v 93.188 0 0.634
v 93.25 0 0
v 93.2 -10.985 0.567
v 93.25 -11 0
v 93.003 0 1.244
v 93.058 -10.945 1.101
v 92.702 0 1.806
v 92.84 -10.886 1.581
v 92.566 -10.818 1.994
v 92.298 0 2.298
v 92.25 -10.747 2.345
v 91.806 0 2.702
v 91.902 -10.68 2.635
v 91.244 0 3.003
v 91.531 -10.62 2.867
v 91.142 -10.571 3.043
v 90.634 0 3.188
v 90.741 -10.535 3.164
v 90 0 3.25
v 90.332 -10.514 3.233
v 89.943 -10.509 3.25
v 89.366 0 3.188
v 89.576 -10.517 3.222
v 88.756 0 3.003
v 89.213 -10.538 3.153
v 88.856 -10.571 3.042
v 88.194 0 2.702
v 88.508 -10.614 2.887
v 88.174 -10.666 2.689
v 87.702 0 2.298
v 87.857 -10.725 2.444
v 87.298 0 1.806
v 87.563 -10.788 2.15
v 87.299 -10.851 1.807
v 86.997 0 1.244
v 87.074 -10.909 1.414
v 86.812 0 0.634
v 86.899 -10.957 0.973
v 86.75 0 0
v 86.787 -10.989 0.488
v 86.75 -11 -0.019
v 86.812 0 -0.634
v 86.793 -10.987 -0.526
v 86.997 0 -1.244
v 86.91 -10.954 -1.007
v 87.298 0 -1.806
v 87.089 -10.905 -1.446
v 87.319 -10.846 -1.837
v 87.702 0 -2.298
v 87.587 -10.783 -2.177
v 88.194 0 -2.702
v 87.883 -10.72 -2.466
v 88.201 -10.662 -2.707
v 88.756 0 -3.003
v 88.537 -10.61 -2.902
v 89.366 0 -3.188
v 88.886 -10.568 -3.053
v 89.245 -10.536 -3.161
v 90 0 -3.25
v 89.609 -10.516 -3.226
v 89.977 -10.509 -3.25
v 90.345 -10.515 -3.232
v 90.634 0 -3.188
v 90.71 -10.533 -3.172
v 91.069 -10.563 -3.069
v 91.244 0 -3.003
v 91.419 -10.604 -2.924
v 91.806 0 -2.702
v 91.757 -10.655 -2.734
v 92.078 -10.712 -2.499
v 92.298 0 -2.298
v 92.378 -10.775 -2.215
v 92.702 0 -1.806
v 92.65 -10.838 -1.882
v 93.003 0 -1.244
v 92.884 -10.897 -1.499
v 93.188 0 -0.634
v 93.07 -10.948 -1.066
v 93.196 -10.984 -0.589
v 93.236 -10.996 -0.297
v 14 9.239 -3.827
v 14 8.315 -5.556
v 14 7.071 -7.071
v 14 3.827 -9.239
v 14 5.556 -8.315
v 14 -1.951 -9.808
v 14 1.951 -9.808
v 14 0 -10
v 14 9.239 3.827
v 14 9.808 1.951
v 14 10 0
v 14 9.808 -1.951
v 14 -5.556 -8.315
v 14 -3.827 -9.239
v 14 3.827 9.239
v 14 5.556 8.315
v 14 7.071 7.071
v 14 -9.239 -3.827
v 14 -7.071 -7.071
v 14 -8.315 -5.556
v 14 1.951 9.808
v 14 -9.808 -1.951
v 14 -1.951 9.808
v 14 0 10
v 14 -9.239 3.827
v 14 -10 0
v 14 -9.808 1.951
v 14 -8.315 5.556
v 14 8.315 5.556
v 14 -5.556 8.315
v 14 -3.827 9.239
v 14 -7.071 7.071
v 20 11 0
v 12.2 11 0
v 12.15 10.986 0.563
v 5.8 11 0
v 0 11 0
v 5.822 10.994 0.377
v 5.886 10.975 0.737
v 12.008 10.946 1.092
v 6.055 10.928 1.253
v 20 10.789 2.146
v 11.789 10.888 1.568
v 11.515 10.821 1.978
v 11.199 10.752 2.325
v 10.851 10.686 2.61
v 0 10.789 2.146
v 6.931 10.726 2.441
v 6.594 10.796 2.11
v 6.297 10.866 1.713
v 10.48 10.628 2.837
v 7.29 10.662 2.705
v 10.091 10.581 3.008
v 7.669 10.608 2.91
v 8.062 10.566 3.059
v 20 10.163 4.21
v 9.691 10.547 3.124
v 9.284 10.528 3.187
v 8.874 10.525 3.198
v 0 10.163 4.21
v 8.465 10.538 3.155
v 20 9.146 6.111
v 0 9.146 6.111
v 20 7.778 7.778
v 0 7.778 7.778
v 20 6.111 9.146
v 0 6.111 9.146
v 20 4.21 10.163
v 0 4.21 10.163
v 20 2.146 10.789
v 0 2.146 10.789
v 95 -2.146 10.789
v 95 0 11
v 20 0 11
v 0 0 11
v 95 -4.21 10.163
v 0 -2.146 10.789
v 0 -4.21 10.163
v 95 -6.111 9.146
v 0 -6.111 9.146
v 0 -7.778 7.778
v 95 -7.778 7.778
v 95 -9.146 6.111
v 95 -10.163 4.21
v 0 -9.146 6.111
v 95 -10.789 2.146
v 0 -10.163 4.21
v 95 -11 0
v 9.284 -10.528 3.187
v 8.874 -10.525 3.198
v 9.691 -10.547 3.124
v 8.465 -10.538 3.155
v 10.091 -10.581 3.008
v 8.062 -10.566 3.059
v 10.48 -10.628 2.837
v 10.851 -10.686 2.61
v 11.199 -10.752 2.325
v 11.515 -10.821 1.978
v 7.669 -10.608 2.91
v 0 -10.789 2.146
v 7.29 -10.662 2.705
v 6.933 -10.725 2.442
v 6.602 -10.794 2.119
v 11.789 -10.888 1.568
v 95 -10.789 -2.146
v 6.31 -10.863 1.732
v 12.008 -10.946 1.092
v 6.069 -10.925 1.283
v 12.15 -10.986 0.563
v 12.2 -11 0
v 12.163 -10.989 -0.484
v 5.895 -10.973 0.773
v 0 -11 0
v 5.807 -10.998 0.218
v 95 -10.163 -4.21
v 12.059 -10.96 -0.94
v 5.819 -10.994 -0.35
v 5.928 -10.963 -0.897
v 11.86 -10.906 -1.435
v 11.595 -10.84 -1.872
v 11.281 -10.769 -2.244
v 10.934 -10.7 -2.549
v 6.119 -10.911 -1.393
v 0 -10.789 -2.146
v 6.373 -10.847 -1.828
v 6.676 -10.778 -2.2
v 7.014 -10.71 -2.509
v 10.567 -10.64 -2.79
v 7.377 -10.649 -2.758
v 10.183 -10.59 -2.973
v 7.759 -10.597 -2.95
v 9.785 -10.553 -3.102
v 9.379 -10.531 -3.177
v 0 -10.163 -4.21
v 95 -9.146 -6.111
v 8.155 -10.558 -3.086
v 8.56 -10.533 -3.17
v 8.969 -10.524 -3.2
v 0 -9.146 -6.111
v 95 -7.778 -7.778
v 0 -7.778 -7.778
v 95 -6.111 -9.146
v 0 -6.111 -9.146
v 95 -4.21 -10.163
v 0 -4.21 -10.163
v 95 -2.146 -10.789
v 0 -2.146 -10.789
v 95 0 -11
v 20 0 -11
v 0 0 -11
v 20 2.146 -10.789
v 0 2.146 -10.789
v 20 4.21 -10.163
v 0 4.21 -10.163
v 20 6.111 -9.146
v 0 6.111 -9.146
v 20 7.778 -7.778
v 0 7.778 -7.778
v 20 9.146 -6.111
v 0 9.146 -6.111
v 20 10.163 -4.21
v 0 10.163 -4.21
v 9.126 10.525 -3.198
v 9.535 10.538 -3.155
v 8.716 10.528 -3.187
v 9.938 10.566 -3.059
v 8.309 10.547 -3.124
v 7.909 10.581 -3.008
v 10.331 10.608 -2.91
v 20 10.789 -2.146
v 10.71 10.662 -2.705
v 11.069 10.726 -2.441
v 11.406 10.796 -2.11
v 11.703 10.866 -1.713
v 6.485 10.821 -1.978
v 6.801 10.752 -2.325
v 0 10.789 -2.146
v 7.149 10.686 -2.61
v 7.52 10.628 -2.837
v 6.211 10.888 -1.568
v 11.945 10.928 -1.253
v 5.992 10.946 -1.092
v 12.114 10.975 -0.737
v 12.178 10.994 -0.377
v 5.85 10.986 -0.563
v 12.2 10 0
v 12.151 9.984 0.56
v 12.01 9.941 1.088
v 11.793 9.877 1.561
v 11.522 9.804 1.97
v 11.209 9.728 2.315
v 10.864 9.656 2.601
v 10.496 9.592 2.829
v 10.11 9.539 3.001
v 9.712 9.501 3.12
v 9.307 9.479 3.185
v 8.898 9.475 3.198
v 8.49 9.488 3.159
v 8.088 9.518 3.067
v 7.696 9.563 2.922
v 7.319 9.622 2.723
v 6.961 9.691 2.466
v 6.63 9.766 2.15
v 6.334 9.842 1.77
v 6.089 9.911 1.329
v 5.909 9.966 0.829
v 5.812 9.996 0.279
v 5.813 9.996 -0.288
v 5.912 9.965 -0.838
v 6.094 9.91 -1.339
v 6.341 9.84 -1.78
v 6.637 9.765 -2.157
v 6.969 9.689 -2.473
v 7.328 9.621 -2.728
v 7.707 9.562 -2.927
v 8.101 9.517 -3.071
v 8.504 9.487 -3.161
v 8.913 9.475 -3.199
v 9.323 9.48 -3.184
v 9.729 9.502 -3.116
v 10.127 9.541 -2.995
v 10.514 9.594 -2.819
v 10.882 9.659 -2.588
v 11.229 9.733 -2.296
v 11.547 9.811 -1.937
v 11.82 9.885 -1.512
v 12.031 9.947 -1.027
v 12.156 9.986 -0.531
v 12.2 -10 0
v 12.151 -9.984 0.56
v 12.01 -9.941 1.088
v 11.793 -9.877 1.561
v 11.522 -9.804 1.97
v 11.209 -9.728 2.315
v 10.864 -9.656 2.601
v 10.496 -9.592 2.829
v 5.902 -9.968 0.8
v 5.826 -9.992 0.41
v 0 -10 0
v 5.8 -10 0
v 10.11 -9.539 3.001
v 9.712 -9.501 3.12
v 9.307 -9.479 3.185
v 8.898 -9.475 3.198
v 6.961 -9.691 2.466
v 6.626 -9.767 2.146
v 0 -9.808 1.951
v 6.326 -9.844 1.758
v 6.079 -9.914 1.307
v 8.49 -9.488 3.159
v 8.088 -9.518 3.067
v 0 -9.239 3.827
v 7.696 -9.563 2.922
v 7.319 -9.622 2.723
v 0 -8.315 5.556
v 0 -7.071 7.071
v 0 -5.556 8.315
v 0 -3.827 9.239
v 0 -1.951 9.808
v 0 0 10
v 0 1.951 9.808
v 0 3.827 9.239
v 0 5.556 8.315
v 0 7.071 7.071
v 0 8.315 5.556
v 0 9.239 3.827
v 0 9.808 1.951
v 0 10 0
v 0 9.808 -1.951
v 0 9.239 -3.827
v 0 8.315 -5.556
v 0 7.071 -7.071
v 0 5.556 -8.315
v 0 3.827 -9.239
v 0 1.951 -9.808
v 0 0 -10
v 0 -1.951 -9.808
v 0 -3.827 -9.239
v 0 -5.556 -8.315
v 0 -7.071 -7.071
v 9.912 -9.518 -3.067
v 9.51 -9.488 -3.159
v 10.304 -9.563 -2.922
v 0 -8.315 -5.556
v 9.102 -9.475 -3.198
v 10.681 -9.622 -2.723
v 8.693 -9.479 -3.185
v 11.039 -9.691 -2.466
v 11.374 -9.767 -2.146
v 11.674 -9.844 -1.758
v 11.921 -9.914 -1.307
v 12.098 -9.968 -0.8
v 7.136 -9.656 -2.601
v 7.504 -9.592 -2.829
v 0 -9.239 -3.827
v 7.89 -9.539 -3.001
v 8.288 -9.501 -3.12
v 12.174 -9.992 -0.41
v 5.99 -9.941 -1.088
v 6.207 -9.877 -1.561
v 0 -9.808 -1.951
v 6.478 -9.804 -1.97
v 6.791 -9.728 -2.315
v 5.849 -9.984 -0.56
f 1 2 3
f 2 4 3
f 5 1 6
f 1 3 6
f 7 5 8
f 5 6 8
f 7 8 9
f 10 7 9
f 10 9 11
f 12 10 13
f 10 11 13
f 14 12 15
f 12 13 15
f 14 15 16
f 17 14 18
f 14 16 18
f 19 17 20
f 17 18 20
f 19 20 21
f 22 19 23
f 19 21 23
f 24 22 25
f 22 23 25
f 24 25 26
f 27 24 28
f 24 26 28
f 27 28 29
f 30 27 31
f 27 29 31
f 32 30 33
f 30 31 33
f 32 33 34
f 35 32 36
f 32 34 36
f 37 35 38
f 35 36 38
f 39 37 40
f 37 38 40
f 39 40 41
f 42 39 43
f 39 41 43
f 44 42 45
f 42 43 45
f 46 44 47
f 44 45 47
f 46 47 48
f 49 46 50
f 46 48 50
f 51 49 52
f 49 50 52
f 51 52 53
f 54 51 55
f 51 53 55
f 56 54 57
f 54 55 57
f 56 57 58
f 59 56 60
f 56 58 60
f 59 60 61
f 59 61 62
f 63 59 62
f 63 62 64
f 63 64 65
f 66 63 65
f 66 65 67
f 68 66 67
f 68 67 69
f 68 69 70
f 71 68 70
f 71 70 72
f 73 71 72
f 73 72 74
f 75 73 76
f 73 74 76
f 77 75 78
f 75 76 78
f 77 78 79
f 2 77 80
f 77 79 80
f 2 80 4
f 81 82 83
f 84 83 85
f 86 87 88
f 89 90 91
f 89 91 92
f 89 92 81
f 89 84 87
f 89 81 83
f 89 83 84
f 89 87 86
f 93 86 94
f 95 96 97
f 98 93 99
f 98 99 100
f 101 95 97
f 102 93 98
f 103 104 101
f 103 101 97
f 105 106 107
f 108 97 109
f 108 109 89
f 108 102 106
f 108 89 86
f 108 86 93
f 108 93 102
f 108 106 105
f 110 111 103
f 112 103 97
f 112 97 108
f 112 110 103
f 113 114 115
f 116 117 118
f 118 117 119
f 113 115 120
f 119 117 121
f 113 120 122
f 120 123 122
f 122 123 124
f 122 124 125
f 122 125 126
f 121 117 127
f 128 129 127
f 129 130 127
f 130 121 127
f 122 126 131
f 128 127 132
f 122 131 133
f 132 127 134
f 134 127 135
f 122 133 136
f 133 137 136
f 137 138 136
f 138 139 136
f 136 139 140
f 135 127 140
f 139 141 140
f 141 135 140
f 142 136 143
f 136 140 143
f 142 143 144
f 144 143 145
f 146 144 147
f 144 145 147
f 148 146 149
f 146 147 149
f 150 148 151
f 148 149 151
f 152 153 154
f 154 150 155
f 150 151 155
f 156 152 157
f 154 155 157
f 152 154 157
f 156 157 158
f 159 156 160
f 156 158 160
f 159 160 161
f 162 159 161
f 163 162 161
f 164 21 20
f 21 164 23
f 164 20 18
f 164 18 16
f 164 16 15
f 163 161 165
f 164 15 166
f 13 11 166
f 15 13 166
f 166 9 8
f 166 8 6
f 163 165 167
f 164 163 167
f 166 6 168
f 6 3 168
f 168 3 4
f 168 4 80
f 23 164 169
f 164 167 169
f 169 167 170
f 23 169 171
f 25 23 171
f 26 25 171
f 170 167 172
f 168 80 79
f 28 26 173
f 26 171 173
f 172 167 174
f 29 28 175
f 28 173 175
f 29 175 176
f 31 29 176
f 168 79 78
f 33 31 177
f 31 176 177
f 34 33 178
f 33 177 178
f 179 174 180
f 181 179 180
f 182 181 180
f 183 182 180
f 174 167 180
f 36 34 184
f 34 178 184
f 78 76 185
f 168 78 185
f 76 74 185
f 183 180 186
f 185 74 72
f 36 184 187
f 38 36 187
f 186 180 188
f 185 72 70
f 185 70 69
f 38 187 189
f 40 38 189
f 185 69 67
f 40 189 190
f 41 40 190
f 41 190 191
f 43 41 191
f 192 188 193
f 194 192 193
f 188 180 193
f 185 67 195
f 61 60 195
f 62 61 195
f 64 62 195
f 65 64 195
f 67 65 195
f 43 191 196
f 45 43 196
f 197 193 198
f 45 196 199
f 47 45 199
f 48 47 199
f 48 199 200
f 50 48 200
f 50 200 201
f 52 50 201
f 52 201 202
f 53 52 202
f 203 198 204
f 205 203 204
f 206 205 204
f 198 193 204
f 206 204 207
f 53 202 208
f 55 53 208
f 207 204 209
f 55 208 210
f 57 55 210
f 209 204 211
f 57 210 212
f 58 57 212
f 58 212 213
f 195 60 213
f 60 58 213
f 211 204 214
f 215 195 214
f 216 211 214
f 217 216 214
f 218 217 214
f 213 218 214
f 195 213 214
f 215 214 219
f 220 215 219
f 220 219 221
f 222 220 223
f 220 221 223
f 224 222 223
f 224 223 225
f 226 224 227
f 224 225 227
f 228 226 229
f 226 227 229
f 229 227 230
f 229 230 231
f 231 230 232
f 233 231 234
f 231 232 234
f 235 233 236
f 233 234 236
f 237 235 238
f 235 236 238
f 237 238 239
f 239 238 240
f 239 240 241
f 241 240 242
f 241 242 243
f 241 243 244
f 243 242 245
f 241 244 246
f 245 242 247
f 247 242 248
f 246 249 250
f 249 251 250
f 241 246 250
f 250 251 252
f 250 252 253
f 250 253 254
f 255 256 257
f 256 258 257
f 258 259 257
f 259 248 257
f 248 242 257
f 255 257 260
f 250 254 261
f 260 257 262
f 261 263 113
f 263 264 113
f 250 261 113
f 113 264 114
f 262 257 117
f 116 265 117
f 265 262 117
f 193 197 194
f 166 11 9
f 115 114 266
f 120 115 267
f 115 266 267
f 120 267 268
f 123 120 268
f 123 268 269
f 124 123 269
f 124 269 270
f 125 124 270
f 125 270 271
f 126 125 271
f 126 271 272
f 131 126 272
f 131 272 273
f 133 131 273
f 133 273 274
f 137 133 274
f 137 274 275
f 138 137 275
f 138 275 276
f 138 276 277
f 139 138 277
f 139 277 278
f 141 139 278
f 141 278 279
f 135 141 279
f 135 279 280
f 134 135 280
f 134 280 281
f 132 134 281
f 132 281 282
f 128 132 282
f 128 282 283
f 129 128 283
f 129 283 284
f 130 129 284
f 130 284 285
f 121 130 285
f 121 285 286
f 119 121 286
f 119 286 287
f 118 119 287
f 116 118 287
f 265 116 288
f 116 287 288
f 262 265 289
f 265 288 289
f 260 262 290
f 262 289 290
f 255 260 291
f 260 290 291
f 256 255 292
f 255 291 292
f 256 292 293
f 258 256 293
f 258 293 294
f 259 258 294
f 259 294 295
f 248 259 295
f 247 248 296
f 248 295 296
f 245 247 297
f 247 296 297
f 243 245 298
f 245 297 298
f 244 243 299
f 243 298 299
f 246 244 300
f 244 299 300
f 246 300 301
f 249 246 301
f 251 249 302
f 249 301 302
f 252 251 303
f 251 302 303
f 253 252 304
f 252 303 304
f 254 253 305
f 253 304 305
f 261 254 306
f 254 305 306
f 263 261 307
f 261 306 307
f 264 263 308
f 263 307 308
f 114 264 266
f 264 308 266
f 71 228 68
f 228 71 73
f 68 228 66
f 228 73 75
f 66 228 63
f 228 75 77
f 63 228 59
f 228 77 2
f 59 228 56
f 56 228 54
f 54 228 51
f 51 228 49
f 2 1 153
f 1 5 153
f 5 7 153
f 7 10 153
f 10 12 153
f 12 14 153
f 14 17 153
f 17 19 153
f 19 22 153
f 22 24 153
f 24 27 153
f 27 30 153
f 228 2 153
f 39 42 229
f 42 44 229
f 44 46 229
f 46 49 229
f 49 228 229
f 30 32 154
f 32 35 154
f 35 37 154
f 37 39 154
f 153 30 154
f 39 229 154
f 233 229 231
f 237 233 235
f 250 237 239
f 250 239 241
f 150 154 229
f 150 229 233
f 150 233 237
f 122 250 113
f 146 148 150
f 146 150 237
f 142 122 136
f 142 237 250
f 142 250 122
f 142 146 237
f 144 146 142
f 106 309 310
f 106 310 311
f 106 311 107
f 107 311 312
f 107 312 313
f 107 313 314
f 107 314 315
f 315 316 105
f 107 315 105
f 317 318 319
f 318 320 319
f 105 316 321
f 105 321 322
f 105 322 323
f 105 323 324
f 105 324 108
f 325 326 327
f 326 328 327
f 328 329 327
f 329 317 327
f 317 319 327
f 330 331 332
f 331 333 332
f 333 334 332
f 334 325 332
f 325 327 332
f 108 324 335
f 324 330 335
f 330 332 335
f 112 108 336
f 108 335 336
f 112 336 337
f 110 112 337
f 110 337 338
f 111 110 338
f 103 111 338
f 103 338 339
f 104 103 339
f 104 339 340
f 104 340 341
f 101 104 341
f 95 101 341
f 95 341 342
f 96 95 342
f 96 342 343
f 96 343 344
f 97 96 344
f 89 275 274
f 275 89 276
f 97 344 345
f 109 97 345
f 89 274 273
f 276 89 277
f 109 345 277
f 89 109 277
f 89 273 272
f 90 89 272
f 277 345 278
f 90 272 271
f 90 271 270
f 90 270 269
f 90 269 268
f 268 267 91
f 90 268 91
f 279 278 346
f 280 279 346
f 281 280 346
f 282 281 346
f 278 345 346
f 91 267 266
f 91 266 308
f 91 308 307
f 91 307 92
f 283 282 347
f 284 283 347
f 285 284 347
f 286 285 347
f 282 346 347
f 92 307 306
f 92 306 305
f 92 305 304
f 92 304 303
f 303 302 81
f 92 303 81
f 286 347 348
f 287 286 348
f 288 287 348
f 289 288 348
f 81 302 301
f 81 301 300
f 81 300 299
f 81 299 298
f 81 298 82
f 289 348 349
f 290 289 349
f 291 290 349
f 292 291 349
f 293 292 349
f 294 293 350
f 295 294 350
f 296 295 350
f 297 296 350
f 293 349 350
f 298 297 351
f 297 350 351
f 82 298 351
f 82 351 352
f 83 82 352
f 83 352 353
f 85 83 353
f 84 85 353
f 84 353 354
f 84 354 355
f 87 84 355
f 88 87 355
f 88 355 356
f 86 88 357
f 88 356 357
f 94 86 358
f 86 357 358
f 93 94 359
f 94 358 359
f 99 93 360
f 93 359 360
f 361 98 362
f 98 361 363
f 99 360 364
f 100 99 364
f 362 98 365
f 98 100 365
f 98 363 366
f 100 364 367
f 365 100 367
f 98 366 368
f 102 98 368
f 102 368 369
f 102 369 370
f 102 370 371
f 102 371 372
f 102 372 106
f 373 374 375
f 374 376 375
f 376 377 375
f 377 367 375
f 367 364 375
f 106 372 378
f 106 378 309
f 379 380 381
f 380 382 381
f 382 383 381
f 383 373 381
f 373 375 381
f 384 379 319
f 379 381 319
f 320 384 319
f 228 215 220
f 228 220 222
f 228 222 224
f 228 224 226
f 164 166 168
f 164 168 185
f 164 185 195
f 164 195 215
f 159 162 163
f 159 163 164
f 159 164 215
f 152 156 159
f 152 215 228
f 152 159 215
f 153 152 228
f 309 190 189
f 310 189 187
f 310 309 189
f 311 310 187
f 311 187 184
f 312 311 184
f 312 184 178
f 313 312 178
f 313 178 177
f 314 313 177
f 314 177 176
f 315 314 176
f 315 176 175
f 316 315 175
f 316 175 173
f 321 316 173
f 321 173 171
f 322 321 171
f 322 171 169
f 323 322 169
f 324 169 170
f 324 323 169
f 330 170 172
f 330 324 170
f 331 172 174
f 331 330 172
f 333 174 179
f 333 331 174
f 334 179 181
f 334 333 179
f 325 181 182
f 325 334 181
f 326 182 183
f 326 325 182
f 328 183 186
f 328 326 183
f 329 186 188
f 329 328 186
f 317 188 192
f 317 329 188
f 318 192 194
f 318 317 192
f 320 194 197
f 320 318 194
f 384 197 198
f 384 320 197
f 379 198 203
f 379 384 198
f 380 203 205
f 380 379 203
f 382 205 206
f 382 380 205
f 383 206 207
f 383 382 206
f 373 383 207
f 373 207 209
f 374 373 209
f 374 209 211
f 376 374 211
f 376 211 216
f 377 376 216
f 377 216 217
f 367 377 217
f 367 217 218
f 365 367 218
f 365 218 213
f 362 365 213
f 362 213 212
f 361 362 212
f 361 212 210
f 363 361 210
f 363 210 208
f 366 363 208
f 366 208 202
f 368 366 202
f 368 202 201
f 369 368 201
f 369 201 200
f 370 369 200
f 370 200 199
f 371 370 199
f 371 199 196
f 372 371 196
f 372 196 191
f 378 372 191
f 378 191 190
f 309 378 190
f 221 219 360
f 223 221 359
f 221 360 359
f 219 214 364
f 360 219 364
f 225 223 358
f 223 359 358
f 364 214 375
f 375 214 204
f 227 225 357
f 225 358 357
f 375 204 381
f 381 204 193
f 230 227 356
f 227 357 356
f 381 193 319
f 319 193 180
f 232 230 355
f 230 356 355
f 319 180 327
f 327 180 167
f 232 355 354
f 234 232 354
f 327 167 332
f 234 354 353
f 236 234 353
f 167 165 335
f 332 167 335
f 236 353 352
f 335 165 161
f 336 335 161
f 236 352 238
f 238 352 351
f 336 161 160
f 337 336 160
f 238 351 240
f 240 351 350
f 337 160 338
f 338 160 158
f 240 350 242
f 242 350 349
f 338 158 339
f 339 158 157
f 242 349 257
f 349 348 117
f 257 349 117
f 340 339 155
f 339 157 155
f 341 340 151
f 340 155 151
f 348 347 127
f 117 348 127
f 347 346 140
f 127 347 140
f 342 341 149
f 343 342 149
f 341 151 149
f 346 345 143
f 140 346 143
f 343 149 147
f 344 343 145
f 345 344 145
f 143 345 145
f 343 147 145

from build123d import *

# Parameters (mm, degrees)
F0_R     = 11
F1_DEPTH = 20
F2_R     = 10
F3_DEPTH = 14
F5_DEPTH = 75
F6_R     = 3.2
F6_R_2   = 3.25
F7_DEPTH = 12.5


with BuildPart() as f1:
    # F0 (on Right) → F1 (new body)
    with BuildSketch(Plane.YZ):
        Circle(F0_R)
    extrude(amount=F1_DEPTH)

    # F2 (on face) → F3 (cut)
    with BuildSketch(Plane(origin=(0, 0, 0), x_dir=(0, -1, 0), z_dir=(-1, 0, 0))):
        Circle(F2_R)
    extrude(amount=-F3_DEPTH, mode=Mode.SUBTRACT)

    # F4 (on face) → F5 (join)
    with BuildSketch(Plane.YZ.offset(20)):
        with BuildLine():
            Line((0, -11), (0, 11))
            ThreePointArc((0, 11), (-11, 0), (0, -11))
        make_face()
    extrude(amount=F5_DEPTH)

    # F6 (on Front) → F7 (cut, symmetric)
    with BuildSketch(Plane.XZ):
        with Locations((9, 0)):
            Circle(F6_R)
        with Locations((90, 0)):
            Circle(F6_R_2)
    extrude(amount=F7_DEPTH, both=True, mode=Mode.SUBTRACT)


solid = f1.part
